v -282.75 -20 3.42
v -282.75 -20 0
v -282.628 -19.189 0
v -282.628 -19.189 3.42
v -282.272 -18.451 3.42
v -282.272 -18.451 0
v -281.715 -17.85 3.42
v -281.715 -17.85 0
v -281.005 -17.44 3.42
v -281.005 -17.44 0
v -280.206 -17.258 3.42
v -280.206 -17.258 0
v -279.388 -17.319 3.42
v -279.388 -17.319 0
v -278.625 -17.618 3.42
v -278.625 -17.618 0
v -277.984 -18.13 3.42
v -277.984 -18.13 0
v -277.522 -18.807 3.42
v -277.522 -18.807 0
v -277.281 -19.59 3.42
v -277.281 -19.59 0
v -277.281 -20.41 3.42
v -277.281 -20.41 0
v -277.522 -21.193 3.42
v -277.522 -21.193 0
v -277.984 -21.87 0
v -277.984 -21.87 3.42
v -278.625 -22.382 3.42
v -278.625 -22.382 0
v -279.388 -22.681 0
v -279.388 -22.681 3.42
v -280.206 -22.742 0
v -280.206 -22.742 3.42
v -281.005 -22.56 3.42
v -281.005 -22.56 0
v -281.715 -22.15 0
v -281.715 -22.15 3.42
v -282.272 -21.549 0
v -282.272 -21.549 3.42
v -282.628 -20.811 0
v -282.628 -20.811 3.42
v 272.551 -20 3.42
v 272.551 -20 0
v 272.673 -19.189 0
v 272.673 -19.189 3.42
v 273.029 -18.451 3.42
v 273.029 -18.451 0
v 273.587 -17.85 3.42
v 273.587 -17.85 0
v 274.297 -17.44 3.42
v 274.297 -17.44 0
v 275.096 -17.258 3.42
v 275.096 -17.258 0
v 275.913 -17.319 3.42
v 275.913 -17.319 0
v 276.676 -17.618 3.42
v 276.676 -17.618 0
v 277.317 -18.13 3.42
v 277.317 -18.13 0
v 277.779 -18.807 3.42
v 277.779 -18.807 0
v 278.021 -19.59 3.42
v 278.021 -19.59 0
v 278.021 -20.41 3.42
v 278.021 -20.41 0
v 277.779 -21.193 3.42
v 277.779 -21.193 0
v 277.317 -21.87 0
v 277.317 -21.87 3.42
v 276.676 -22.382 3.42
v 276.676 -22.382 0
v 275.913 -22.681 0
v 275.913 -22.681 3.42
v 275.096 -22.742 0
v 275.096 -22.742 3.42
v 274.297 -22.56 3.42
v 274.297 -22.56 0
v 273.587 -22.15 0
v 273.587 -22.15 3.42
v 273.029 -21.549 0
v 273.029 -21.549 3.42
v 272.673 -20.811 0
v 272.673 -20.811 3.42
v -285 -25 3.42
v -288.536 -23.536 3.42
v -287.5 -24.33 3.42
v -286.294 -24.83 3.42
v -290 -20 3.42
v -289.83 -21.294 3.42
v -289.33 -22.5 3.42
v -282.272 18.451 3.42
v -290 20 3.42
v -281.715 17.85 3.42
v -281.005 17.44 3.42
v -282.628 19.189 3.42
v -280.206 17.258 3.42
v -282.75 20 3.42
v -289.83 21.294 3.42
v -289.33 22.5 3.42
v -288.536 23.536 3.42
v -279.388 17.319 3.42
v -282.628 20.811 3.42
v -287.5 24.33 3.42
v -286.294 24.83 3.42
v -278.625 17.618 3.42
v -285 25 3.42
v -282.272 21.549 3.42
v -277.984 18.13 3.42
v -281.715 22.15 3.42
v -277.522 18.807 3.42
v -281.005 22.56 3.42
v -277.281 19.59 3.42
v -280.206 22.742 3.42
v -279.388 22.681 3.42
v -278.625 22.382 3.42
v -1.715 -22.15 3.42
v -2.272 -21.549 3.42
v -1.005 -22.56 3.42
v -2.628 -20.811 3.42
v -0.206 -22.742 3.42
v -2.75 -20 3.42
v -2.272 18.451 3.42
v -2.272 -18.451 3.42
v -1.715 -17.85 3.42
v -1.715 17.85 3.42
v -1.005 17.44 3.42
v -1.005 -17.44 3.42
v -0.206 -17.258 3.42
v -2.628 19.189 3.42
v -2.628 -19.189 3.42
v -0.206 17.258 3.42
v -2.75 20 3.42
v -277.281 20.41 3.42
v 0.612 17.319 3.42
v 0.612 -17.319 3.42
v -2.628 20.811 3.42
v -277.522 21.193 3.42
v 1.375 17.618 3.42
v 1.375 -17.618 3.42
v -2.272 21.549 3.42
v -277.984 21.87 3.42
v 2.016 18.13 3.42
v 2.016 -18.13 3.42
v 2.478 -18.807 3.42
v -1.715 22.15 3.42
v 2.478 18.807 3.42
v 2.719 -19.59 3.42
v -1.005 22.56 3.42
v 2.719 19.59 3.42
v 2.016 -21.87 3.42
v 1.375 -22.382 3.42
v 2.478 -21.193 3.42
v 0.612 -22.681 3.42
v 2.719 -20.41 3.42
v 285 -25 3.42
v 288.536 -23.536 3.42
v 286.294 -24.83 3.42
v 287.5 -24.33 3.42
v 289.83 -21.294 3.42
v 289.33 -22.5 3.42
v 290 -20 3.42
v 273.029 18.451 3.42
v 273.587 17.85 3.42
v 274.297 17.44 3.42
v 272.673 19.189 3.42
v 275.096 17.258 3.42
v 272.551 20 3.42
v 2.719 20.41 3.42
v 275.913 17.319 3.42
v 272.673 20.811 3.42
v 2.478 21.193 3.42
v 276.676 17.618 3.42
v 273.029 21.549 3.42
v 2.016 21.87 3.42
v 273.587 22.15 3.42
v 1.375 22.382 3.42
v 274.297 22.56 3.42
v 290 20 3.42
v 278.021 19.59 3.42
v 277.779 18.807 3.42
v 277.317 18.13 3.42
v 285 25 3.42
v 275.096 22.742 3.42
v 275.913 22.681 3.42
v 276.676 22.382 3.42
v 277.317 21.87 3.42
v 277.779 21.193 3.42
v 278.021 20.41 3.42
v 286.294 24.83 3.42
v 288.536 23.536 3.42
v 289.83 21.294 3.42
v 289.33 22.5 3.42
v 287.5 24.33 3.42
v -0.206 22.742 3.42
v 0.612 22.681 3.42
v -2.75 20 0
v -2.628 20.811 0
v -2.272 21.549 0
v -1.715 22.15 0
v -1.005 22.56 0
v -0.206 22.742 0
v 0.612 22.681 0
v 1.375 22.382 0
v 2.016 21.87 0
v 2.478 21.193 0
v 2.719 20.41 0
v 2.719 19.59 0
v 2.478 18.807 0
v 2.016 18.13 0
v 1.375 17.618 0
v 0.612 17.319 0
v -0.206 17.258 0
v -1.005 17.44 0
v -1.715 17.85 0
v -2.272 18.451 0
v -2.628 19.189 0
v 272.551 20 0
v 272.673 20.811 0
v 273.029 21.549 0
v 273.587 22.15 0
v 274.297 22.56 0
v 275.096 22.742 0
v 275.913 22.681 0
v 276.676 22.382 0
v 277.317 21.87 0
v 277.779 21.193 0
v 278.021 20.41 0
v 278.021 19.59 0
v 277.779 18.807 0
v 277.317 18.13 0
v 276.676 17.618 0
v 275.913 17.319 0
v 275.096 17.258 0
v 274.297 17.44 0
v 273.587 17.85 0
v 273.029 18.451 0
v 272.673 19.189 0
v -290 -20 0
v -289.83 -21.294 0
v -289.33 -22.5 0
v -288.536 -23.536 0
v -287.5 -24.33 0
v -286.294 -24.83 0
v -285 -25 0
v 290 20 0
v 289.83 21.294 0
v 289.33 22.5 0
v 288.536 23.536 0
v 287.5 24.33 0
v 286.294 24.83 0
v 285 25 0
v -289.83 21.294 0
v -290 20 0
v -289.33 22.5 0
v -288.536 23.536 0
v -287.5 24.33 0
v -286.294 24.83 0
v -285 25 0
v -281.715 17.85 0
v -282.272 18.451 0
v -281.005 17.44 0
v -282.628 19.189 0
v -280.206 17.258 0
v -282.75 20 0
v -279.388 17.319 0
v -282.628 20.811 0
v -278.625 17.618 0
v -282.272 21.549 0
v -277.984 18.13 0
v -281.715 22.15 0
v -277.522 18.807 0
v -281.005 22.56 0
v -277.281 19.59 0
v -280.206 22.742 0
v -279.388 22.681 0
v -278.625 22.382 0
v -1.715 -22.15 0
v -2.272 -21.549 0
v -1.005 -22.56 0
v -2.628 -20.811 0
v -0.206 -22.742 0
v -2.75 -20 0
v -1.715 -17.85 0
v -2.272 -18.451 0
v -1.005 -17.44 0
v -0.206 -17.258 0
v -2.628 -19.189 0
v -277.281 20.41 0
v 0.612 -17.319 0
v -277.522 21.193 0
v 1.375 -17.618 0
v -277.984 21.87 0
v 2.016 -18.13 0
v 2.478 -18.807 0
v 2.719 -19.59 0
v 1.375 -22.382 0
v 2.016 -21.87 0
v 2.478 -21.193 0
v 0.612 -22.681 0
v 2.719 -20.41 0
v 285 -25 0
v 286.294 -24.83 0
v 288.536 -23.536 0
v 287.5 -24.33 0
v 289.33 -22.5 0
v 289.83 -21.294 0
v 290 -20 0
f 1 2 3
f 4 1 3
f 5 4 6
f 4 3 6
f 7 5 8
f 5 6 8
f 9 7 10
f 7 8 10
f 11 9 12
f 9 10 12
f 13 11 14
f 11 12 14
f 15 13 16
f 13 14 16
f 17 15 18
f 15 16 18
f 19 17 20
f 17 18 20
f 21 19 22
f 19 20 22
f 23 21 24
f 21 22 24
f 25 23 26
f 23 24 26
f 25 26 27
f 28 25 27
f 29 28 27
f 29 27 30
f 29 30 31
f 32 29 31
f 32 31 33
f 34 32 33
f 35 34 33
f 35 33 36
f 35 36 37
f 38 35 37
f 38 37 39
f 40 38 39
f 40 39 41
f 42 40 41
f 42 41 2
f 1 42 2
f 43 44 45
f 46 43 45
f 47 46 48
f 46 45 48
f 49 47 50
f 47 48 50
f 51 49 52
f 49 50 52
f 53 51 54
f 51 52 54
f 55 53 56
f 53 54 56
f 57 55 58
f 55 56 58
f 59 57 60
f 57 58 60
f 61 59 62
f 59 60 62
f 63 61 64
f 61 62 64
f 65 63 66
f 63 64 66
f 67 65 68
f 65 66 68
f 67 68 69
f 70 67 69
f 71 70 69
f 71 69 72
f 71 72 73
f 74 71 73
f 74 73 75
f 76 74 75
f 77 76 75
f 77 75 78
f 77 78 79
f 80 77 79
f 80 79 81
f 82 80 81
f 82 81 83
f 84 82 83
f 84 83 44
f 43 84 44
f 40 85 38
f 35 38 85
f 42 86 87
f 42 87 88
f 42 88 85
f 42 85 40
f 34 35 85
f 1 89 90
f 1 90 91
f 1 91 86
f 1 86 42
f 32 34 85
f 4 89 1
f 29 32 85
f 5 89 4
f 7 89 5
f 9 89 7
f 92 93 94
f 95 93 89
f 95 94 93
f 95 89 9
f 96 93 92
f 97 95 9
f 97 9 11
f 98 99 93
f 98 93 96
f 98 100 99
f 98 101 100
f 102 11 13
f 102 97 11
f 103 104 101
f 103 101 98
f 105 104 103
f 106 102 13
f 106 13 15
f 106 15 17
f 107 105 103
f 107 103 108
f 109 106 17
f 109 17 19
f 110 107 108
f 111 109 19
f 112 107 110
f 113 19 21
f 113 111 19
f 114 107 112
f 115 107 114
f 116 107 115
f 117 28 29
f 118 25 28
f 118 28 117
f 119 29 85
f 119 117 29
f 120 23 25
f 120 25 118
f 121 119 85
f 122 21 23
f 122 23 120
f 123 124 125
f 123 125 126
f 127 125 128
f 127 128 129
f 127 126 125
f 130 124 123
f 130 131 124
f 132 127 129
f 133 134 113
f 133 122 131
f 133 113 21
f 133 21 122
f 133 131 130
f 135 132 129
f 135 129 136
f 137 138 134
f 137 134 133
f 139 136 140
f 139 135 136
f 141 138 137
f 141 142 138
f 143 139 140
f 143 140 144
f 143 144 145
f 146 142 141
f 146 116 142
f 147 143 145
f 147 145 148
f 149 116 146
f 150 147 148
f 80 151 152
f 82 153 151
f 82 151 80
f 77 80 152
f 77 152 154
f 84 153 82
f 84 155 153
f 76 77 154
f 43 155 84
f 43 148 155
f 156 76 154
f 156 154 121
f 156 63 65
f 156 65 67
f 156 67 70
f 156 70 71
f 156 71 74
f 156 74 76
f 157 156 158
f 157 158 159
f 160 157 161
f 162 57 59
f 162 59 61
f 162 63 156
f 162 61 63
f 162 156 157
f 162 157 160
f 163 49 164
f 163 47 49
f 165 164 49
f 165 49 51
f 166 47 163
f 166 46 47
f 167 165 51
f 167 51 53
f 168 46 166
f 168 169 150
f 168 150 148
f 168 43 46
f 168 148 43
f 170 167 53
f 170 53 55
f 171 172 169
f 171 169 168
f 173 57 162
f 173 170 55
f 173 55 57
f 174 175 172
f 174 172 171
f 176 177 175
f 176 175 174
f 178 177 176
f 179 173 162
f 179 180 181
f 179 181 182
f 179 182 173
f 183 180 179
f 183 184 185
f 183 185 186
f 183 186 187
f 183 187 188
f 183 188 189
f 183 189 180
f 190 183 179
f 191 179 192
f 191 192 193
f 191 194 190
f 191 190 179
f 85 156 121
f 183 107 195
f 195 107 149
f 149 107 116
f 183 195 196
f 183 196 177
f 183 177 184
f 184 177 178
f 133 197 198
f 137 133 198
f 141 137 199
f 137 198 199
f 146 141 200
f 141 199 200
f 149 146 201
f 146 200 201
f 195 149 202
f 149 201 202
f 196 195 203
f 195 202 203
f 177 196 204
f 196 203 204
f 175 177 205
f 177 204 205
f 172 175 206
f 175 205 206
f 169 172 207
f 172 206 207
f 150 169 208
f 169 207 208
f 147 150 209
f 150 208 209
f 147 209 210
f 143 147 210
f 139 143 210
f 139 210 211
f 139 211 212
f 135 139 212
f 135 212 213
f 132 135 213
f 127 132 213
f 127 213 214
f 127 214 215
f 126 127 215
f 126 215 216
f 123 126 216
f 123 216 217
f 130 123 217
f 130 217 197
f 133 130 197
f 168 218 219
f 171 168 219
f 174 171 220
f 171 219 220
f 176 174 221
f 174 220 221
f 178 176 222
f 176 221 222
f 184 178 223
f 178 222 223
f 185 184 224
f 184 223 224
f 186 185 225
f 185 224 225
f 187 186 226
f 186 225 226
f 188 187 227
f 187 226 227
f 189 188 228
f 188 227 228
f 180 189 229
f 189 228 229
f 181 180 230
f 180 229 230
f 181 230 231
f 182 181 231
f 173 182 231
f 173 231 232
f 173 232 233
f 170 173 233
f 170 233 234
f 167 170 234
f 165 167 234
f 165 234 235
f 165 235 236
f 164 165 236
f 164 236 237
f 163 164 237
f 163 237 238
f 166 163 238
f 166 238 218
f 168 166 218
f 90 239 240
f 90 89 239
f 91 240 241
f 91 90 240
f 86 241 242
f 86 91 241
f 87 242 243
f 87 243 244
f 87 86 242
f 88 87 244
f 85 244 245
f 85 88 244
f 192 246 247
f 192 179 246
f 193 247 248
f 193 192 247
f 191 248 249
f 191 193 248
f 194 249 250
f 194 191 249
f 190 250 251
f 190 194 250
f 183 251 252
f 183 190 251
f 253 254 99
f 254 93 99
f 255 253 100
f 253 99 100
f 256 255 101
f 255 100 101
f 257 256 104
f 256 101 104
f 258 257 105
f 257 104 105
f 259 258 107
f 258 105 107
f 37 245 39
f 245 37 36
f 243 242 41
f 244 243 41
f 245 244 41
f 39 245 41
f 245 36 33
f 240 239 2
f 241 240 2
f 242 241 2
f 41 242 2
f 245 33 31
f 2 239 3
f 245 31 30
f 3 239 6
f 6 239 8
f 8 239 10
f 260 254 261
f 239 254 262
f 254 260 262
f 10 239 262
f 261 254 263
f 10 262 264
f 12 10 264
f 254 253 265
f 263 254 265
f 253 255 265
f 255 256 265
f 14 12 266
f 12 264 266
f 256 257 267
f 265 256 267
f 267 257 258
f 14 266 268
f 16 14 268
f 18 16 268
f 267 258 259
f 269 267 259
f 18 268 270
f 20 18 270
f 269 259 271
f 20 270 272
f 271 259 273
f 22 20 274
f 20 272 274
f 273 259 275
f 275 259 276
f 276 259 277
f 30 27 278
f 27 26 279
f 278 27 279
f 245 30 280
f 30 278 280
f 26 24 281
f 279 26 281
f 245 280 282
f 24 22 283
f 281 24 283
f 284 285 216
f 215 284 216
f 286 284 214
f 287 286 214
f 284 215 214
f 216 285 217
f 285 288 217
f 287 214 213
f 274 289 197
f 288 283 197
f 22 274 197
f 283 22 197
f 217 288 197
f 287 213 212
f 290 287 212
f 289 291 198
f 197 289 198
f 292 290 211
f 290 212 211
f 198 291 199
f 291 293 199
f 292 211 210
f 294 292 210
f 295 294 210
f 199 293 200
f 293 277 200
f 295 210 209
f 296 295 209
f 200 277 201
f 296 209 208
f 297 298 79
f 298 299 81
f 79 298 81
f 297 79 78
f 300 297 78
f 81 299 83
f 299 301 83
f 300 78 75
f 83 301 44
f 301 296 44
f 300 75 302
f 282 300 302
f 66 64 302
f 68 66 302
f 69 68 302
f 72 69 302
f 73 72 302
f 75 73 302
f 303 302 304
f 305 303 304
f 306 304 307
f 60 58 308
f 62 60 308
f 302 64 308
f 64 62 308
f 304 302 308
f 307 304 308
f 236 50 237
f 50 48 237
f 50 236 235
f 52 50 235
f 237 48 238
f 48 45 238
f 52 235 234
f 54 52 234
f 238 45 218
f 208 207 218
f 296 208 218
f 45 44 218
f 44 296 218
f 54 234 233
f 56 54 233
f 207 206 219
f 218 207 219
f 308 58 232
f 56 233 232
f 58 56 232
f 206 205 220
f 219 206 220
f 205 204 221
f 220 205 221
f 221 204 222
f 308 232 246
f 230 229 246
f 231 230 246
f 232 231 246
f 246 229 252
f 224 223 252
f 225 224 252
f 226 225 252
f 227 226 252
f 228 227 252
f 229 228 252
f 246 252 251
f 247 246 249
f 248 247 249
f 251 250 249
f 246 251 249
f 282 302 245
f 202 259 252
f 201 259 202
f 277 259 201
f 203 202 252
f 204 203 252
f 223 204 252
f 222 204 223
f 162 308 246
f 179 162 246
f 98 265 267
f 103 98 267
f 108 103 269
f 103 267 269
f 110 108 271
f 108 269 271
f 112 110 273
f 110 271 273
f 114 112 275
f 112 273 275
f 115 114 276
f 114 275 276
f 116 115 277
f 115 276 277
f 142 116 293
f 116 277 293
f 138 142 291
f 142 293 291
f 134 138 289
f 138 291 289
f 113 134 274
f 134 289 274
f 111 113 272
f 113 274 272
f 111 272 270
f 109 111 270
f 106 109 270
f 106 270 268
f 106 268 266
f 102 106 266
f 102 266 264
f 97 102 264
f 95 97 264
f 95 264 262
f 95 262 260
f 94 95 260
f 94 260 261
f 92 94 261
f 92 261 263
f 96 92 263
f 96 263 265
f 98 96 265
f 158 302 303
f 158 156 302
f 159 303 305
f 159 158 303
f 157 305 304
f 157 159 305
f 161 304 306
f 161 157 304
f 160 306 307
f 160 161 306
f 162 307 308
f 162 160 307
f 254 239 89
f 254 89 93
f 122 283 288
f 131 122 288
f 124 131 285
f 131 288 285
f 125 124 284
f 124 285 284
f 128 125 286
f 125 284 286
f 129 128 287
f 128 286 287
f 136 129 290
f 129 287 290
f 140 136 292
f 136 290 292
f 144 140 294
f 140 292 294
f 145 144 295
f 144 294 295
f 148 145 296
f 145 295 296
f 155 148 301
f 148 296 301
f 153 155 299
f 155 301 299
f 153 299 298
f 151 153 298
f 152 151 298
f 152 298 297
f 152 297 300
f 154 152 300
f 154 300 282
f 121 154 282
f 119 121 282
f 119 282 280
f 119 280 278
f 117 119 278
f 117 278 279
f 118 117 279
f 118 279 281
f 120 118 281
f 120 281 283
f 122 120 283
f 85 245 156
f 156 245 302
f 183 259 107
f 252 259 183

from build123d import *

# Parameters (mm, degrees)
F0_W     = 580
F0_H     = 50
F1_DEPTH = 3.42
F2_R     = 5
F4_D     = 5.5


with BuildPart() as f1:
    # F0 (on Top) → F1 (new body)
    with BuildSketch(Plane.XY):
        Rectangle(F0_W, F0_H)
    extrude(amount=F1_DEPTH)

    # F2
    f2_edges = [f1.edges().sort_by_distance(p)[0] for p in [
        (-290, 25, 1.71),
        (-290, -25, 1.71),
        (290, 25, 1.71),
        (290, -25, 1.71),
    ]]
    fillet(f2_edges, radius=F2_R)

    # F4 (through all)
    with Locations(Plane.XY.offset(3.42)):
        with Locations((-280, -20), (0, -20), (275.3012527625, -20), (275.3012527625, 20), (0, 20), (-280, 20)):
            Hole(F4_D / 2)


solid = f1.part
